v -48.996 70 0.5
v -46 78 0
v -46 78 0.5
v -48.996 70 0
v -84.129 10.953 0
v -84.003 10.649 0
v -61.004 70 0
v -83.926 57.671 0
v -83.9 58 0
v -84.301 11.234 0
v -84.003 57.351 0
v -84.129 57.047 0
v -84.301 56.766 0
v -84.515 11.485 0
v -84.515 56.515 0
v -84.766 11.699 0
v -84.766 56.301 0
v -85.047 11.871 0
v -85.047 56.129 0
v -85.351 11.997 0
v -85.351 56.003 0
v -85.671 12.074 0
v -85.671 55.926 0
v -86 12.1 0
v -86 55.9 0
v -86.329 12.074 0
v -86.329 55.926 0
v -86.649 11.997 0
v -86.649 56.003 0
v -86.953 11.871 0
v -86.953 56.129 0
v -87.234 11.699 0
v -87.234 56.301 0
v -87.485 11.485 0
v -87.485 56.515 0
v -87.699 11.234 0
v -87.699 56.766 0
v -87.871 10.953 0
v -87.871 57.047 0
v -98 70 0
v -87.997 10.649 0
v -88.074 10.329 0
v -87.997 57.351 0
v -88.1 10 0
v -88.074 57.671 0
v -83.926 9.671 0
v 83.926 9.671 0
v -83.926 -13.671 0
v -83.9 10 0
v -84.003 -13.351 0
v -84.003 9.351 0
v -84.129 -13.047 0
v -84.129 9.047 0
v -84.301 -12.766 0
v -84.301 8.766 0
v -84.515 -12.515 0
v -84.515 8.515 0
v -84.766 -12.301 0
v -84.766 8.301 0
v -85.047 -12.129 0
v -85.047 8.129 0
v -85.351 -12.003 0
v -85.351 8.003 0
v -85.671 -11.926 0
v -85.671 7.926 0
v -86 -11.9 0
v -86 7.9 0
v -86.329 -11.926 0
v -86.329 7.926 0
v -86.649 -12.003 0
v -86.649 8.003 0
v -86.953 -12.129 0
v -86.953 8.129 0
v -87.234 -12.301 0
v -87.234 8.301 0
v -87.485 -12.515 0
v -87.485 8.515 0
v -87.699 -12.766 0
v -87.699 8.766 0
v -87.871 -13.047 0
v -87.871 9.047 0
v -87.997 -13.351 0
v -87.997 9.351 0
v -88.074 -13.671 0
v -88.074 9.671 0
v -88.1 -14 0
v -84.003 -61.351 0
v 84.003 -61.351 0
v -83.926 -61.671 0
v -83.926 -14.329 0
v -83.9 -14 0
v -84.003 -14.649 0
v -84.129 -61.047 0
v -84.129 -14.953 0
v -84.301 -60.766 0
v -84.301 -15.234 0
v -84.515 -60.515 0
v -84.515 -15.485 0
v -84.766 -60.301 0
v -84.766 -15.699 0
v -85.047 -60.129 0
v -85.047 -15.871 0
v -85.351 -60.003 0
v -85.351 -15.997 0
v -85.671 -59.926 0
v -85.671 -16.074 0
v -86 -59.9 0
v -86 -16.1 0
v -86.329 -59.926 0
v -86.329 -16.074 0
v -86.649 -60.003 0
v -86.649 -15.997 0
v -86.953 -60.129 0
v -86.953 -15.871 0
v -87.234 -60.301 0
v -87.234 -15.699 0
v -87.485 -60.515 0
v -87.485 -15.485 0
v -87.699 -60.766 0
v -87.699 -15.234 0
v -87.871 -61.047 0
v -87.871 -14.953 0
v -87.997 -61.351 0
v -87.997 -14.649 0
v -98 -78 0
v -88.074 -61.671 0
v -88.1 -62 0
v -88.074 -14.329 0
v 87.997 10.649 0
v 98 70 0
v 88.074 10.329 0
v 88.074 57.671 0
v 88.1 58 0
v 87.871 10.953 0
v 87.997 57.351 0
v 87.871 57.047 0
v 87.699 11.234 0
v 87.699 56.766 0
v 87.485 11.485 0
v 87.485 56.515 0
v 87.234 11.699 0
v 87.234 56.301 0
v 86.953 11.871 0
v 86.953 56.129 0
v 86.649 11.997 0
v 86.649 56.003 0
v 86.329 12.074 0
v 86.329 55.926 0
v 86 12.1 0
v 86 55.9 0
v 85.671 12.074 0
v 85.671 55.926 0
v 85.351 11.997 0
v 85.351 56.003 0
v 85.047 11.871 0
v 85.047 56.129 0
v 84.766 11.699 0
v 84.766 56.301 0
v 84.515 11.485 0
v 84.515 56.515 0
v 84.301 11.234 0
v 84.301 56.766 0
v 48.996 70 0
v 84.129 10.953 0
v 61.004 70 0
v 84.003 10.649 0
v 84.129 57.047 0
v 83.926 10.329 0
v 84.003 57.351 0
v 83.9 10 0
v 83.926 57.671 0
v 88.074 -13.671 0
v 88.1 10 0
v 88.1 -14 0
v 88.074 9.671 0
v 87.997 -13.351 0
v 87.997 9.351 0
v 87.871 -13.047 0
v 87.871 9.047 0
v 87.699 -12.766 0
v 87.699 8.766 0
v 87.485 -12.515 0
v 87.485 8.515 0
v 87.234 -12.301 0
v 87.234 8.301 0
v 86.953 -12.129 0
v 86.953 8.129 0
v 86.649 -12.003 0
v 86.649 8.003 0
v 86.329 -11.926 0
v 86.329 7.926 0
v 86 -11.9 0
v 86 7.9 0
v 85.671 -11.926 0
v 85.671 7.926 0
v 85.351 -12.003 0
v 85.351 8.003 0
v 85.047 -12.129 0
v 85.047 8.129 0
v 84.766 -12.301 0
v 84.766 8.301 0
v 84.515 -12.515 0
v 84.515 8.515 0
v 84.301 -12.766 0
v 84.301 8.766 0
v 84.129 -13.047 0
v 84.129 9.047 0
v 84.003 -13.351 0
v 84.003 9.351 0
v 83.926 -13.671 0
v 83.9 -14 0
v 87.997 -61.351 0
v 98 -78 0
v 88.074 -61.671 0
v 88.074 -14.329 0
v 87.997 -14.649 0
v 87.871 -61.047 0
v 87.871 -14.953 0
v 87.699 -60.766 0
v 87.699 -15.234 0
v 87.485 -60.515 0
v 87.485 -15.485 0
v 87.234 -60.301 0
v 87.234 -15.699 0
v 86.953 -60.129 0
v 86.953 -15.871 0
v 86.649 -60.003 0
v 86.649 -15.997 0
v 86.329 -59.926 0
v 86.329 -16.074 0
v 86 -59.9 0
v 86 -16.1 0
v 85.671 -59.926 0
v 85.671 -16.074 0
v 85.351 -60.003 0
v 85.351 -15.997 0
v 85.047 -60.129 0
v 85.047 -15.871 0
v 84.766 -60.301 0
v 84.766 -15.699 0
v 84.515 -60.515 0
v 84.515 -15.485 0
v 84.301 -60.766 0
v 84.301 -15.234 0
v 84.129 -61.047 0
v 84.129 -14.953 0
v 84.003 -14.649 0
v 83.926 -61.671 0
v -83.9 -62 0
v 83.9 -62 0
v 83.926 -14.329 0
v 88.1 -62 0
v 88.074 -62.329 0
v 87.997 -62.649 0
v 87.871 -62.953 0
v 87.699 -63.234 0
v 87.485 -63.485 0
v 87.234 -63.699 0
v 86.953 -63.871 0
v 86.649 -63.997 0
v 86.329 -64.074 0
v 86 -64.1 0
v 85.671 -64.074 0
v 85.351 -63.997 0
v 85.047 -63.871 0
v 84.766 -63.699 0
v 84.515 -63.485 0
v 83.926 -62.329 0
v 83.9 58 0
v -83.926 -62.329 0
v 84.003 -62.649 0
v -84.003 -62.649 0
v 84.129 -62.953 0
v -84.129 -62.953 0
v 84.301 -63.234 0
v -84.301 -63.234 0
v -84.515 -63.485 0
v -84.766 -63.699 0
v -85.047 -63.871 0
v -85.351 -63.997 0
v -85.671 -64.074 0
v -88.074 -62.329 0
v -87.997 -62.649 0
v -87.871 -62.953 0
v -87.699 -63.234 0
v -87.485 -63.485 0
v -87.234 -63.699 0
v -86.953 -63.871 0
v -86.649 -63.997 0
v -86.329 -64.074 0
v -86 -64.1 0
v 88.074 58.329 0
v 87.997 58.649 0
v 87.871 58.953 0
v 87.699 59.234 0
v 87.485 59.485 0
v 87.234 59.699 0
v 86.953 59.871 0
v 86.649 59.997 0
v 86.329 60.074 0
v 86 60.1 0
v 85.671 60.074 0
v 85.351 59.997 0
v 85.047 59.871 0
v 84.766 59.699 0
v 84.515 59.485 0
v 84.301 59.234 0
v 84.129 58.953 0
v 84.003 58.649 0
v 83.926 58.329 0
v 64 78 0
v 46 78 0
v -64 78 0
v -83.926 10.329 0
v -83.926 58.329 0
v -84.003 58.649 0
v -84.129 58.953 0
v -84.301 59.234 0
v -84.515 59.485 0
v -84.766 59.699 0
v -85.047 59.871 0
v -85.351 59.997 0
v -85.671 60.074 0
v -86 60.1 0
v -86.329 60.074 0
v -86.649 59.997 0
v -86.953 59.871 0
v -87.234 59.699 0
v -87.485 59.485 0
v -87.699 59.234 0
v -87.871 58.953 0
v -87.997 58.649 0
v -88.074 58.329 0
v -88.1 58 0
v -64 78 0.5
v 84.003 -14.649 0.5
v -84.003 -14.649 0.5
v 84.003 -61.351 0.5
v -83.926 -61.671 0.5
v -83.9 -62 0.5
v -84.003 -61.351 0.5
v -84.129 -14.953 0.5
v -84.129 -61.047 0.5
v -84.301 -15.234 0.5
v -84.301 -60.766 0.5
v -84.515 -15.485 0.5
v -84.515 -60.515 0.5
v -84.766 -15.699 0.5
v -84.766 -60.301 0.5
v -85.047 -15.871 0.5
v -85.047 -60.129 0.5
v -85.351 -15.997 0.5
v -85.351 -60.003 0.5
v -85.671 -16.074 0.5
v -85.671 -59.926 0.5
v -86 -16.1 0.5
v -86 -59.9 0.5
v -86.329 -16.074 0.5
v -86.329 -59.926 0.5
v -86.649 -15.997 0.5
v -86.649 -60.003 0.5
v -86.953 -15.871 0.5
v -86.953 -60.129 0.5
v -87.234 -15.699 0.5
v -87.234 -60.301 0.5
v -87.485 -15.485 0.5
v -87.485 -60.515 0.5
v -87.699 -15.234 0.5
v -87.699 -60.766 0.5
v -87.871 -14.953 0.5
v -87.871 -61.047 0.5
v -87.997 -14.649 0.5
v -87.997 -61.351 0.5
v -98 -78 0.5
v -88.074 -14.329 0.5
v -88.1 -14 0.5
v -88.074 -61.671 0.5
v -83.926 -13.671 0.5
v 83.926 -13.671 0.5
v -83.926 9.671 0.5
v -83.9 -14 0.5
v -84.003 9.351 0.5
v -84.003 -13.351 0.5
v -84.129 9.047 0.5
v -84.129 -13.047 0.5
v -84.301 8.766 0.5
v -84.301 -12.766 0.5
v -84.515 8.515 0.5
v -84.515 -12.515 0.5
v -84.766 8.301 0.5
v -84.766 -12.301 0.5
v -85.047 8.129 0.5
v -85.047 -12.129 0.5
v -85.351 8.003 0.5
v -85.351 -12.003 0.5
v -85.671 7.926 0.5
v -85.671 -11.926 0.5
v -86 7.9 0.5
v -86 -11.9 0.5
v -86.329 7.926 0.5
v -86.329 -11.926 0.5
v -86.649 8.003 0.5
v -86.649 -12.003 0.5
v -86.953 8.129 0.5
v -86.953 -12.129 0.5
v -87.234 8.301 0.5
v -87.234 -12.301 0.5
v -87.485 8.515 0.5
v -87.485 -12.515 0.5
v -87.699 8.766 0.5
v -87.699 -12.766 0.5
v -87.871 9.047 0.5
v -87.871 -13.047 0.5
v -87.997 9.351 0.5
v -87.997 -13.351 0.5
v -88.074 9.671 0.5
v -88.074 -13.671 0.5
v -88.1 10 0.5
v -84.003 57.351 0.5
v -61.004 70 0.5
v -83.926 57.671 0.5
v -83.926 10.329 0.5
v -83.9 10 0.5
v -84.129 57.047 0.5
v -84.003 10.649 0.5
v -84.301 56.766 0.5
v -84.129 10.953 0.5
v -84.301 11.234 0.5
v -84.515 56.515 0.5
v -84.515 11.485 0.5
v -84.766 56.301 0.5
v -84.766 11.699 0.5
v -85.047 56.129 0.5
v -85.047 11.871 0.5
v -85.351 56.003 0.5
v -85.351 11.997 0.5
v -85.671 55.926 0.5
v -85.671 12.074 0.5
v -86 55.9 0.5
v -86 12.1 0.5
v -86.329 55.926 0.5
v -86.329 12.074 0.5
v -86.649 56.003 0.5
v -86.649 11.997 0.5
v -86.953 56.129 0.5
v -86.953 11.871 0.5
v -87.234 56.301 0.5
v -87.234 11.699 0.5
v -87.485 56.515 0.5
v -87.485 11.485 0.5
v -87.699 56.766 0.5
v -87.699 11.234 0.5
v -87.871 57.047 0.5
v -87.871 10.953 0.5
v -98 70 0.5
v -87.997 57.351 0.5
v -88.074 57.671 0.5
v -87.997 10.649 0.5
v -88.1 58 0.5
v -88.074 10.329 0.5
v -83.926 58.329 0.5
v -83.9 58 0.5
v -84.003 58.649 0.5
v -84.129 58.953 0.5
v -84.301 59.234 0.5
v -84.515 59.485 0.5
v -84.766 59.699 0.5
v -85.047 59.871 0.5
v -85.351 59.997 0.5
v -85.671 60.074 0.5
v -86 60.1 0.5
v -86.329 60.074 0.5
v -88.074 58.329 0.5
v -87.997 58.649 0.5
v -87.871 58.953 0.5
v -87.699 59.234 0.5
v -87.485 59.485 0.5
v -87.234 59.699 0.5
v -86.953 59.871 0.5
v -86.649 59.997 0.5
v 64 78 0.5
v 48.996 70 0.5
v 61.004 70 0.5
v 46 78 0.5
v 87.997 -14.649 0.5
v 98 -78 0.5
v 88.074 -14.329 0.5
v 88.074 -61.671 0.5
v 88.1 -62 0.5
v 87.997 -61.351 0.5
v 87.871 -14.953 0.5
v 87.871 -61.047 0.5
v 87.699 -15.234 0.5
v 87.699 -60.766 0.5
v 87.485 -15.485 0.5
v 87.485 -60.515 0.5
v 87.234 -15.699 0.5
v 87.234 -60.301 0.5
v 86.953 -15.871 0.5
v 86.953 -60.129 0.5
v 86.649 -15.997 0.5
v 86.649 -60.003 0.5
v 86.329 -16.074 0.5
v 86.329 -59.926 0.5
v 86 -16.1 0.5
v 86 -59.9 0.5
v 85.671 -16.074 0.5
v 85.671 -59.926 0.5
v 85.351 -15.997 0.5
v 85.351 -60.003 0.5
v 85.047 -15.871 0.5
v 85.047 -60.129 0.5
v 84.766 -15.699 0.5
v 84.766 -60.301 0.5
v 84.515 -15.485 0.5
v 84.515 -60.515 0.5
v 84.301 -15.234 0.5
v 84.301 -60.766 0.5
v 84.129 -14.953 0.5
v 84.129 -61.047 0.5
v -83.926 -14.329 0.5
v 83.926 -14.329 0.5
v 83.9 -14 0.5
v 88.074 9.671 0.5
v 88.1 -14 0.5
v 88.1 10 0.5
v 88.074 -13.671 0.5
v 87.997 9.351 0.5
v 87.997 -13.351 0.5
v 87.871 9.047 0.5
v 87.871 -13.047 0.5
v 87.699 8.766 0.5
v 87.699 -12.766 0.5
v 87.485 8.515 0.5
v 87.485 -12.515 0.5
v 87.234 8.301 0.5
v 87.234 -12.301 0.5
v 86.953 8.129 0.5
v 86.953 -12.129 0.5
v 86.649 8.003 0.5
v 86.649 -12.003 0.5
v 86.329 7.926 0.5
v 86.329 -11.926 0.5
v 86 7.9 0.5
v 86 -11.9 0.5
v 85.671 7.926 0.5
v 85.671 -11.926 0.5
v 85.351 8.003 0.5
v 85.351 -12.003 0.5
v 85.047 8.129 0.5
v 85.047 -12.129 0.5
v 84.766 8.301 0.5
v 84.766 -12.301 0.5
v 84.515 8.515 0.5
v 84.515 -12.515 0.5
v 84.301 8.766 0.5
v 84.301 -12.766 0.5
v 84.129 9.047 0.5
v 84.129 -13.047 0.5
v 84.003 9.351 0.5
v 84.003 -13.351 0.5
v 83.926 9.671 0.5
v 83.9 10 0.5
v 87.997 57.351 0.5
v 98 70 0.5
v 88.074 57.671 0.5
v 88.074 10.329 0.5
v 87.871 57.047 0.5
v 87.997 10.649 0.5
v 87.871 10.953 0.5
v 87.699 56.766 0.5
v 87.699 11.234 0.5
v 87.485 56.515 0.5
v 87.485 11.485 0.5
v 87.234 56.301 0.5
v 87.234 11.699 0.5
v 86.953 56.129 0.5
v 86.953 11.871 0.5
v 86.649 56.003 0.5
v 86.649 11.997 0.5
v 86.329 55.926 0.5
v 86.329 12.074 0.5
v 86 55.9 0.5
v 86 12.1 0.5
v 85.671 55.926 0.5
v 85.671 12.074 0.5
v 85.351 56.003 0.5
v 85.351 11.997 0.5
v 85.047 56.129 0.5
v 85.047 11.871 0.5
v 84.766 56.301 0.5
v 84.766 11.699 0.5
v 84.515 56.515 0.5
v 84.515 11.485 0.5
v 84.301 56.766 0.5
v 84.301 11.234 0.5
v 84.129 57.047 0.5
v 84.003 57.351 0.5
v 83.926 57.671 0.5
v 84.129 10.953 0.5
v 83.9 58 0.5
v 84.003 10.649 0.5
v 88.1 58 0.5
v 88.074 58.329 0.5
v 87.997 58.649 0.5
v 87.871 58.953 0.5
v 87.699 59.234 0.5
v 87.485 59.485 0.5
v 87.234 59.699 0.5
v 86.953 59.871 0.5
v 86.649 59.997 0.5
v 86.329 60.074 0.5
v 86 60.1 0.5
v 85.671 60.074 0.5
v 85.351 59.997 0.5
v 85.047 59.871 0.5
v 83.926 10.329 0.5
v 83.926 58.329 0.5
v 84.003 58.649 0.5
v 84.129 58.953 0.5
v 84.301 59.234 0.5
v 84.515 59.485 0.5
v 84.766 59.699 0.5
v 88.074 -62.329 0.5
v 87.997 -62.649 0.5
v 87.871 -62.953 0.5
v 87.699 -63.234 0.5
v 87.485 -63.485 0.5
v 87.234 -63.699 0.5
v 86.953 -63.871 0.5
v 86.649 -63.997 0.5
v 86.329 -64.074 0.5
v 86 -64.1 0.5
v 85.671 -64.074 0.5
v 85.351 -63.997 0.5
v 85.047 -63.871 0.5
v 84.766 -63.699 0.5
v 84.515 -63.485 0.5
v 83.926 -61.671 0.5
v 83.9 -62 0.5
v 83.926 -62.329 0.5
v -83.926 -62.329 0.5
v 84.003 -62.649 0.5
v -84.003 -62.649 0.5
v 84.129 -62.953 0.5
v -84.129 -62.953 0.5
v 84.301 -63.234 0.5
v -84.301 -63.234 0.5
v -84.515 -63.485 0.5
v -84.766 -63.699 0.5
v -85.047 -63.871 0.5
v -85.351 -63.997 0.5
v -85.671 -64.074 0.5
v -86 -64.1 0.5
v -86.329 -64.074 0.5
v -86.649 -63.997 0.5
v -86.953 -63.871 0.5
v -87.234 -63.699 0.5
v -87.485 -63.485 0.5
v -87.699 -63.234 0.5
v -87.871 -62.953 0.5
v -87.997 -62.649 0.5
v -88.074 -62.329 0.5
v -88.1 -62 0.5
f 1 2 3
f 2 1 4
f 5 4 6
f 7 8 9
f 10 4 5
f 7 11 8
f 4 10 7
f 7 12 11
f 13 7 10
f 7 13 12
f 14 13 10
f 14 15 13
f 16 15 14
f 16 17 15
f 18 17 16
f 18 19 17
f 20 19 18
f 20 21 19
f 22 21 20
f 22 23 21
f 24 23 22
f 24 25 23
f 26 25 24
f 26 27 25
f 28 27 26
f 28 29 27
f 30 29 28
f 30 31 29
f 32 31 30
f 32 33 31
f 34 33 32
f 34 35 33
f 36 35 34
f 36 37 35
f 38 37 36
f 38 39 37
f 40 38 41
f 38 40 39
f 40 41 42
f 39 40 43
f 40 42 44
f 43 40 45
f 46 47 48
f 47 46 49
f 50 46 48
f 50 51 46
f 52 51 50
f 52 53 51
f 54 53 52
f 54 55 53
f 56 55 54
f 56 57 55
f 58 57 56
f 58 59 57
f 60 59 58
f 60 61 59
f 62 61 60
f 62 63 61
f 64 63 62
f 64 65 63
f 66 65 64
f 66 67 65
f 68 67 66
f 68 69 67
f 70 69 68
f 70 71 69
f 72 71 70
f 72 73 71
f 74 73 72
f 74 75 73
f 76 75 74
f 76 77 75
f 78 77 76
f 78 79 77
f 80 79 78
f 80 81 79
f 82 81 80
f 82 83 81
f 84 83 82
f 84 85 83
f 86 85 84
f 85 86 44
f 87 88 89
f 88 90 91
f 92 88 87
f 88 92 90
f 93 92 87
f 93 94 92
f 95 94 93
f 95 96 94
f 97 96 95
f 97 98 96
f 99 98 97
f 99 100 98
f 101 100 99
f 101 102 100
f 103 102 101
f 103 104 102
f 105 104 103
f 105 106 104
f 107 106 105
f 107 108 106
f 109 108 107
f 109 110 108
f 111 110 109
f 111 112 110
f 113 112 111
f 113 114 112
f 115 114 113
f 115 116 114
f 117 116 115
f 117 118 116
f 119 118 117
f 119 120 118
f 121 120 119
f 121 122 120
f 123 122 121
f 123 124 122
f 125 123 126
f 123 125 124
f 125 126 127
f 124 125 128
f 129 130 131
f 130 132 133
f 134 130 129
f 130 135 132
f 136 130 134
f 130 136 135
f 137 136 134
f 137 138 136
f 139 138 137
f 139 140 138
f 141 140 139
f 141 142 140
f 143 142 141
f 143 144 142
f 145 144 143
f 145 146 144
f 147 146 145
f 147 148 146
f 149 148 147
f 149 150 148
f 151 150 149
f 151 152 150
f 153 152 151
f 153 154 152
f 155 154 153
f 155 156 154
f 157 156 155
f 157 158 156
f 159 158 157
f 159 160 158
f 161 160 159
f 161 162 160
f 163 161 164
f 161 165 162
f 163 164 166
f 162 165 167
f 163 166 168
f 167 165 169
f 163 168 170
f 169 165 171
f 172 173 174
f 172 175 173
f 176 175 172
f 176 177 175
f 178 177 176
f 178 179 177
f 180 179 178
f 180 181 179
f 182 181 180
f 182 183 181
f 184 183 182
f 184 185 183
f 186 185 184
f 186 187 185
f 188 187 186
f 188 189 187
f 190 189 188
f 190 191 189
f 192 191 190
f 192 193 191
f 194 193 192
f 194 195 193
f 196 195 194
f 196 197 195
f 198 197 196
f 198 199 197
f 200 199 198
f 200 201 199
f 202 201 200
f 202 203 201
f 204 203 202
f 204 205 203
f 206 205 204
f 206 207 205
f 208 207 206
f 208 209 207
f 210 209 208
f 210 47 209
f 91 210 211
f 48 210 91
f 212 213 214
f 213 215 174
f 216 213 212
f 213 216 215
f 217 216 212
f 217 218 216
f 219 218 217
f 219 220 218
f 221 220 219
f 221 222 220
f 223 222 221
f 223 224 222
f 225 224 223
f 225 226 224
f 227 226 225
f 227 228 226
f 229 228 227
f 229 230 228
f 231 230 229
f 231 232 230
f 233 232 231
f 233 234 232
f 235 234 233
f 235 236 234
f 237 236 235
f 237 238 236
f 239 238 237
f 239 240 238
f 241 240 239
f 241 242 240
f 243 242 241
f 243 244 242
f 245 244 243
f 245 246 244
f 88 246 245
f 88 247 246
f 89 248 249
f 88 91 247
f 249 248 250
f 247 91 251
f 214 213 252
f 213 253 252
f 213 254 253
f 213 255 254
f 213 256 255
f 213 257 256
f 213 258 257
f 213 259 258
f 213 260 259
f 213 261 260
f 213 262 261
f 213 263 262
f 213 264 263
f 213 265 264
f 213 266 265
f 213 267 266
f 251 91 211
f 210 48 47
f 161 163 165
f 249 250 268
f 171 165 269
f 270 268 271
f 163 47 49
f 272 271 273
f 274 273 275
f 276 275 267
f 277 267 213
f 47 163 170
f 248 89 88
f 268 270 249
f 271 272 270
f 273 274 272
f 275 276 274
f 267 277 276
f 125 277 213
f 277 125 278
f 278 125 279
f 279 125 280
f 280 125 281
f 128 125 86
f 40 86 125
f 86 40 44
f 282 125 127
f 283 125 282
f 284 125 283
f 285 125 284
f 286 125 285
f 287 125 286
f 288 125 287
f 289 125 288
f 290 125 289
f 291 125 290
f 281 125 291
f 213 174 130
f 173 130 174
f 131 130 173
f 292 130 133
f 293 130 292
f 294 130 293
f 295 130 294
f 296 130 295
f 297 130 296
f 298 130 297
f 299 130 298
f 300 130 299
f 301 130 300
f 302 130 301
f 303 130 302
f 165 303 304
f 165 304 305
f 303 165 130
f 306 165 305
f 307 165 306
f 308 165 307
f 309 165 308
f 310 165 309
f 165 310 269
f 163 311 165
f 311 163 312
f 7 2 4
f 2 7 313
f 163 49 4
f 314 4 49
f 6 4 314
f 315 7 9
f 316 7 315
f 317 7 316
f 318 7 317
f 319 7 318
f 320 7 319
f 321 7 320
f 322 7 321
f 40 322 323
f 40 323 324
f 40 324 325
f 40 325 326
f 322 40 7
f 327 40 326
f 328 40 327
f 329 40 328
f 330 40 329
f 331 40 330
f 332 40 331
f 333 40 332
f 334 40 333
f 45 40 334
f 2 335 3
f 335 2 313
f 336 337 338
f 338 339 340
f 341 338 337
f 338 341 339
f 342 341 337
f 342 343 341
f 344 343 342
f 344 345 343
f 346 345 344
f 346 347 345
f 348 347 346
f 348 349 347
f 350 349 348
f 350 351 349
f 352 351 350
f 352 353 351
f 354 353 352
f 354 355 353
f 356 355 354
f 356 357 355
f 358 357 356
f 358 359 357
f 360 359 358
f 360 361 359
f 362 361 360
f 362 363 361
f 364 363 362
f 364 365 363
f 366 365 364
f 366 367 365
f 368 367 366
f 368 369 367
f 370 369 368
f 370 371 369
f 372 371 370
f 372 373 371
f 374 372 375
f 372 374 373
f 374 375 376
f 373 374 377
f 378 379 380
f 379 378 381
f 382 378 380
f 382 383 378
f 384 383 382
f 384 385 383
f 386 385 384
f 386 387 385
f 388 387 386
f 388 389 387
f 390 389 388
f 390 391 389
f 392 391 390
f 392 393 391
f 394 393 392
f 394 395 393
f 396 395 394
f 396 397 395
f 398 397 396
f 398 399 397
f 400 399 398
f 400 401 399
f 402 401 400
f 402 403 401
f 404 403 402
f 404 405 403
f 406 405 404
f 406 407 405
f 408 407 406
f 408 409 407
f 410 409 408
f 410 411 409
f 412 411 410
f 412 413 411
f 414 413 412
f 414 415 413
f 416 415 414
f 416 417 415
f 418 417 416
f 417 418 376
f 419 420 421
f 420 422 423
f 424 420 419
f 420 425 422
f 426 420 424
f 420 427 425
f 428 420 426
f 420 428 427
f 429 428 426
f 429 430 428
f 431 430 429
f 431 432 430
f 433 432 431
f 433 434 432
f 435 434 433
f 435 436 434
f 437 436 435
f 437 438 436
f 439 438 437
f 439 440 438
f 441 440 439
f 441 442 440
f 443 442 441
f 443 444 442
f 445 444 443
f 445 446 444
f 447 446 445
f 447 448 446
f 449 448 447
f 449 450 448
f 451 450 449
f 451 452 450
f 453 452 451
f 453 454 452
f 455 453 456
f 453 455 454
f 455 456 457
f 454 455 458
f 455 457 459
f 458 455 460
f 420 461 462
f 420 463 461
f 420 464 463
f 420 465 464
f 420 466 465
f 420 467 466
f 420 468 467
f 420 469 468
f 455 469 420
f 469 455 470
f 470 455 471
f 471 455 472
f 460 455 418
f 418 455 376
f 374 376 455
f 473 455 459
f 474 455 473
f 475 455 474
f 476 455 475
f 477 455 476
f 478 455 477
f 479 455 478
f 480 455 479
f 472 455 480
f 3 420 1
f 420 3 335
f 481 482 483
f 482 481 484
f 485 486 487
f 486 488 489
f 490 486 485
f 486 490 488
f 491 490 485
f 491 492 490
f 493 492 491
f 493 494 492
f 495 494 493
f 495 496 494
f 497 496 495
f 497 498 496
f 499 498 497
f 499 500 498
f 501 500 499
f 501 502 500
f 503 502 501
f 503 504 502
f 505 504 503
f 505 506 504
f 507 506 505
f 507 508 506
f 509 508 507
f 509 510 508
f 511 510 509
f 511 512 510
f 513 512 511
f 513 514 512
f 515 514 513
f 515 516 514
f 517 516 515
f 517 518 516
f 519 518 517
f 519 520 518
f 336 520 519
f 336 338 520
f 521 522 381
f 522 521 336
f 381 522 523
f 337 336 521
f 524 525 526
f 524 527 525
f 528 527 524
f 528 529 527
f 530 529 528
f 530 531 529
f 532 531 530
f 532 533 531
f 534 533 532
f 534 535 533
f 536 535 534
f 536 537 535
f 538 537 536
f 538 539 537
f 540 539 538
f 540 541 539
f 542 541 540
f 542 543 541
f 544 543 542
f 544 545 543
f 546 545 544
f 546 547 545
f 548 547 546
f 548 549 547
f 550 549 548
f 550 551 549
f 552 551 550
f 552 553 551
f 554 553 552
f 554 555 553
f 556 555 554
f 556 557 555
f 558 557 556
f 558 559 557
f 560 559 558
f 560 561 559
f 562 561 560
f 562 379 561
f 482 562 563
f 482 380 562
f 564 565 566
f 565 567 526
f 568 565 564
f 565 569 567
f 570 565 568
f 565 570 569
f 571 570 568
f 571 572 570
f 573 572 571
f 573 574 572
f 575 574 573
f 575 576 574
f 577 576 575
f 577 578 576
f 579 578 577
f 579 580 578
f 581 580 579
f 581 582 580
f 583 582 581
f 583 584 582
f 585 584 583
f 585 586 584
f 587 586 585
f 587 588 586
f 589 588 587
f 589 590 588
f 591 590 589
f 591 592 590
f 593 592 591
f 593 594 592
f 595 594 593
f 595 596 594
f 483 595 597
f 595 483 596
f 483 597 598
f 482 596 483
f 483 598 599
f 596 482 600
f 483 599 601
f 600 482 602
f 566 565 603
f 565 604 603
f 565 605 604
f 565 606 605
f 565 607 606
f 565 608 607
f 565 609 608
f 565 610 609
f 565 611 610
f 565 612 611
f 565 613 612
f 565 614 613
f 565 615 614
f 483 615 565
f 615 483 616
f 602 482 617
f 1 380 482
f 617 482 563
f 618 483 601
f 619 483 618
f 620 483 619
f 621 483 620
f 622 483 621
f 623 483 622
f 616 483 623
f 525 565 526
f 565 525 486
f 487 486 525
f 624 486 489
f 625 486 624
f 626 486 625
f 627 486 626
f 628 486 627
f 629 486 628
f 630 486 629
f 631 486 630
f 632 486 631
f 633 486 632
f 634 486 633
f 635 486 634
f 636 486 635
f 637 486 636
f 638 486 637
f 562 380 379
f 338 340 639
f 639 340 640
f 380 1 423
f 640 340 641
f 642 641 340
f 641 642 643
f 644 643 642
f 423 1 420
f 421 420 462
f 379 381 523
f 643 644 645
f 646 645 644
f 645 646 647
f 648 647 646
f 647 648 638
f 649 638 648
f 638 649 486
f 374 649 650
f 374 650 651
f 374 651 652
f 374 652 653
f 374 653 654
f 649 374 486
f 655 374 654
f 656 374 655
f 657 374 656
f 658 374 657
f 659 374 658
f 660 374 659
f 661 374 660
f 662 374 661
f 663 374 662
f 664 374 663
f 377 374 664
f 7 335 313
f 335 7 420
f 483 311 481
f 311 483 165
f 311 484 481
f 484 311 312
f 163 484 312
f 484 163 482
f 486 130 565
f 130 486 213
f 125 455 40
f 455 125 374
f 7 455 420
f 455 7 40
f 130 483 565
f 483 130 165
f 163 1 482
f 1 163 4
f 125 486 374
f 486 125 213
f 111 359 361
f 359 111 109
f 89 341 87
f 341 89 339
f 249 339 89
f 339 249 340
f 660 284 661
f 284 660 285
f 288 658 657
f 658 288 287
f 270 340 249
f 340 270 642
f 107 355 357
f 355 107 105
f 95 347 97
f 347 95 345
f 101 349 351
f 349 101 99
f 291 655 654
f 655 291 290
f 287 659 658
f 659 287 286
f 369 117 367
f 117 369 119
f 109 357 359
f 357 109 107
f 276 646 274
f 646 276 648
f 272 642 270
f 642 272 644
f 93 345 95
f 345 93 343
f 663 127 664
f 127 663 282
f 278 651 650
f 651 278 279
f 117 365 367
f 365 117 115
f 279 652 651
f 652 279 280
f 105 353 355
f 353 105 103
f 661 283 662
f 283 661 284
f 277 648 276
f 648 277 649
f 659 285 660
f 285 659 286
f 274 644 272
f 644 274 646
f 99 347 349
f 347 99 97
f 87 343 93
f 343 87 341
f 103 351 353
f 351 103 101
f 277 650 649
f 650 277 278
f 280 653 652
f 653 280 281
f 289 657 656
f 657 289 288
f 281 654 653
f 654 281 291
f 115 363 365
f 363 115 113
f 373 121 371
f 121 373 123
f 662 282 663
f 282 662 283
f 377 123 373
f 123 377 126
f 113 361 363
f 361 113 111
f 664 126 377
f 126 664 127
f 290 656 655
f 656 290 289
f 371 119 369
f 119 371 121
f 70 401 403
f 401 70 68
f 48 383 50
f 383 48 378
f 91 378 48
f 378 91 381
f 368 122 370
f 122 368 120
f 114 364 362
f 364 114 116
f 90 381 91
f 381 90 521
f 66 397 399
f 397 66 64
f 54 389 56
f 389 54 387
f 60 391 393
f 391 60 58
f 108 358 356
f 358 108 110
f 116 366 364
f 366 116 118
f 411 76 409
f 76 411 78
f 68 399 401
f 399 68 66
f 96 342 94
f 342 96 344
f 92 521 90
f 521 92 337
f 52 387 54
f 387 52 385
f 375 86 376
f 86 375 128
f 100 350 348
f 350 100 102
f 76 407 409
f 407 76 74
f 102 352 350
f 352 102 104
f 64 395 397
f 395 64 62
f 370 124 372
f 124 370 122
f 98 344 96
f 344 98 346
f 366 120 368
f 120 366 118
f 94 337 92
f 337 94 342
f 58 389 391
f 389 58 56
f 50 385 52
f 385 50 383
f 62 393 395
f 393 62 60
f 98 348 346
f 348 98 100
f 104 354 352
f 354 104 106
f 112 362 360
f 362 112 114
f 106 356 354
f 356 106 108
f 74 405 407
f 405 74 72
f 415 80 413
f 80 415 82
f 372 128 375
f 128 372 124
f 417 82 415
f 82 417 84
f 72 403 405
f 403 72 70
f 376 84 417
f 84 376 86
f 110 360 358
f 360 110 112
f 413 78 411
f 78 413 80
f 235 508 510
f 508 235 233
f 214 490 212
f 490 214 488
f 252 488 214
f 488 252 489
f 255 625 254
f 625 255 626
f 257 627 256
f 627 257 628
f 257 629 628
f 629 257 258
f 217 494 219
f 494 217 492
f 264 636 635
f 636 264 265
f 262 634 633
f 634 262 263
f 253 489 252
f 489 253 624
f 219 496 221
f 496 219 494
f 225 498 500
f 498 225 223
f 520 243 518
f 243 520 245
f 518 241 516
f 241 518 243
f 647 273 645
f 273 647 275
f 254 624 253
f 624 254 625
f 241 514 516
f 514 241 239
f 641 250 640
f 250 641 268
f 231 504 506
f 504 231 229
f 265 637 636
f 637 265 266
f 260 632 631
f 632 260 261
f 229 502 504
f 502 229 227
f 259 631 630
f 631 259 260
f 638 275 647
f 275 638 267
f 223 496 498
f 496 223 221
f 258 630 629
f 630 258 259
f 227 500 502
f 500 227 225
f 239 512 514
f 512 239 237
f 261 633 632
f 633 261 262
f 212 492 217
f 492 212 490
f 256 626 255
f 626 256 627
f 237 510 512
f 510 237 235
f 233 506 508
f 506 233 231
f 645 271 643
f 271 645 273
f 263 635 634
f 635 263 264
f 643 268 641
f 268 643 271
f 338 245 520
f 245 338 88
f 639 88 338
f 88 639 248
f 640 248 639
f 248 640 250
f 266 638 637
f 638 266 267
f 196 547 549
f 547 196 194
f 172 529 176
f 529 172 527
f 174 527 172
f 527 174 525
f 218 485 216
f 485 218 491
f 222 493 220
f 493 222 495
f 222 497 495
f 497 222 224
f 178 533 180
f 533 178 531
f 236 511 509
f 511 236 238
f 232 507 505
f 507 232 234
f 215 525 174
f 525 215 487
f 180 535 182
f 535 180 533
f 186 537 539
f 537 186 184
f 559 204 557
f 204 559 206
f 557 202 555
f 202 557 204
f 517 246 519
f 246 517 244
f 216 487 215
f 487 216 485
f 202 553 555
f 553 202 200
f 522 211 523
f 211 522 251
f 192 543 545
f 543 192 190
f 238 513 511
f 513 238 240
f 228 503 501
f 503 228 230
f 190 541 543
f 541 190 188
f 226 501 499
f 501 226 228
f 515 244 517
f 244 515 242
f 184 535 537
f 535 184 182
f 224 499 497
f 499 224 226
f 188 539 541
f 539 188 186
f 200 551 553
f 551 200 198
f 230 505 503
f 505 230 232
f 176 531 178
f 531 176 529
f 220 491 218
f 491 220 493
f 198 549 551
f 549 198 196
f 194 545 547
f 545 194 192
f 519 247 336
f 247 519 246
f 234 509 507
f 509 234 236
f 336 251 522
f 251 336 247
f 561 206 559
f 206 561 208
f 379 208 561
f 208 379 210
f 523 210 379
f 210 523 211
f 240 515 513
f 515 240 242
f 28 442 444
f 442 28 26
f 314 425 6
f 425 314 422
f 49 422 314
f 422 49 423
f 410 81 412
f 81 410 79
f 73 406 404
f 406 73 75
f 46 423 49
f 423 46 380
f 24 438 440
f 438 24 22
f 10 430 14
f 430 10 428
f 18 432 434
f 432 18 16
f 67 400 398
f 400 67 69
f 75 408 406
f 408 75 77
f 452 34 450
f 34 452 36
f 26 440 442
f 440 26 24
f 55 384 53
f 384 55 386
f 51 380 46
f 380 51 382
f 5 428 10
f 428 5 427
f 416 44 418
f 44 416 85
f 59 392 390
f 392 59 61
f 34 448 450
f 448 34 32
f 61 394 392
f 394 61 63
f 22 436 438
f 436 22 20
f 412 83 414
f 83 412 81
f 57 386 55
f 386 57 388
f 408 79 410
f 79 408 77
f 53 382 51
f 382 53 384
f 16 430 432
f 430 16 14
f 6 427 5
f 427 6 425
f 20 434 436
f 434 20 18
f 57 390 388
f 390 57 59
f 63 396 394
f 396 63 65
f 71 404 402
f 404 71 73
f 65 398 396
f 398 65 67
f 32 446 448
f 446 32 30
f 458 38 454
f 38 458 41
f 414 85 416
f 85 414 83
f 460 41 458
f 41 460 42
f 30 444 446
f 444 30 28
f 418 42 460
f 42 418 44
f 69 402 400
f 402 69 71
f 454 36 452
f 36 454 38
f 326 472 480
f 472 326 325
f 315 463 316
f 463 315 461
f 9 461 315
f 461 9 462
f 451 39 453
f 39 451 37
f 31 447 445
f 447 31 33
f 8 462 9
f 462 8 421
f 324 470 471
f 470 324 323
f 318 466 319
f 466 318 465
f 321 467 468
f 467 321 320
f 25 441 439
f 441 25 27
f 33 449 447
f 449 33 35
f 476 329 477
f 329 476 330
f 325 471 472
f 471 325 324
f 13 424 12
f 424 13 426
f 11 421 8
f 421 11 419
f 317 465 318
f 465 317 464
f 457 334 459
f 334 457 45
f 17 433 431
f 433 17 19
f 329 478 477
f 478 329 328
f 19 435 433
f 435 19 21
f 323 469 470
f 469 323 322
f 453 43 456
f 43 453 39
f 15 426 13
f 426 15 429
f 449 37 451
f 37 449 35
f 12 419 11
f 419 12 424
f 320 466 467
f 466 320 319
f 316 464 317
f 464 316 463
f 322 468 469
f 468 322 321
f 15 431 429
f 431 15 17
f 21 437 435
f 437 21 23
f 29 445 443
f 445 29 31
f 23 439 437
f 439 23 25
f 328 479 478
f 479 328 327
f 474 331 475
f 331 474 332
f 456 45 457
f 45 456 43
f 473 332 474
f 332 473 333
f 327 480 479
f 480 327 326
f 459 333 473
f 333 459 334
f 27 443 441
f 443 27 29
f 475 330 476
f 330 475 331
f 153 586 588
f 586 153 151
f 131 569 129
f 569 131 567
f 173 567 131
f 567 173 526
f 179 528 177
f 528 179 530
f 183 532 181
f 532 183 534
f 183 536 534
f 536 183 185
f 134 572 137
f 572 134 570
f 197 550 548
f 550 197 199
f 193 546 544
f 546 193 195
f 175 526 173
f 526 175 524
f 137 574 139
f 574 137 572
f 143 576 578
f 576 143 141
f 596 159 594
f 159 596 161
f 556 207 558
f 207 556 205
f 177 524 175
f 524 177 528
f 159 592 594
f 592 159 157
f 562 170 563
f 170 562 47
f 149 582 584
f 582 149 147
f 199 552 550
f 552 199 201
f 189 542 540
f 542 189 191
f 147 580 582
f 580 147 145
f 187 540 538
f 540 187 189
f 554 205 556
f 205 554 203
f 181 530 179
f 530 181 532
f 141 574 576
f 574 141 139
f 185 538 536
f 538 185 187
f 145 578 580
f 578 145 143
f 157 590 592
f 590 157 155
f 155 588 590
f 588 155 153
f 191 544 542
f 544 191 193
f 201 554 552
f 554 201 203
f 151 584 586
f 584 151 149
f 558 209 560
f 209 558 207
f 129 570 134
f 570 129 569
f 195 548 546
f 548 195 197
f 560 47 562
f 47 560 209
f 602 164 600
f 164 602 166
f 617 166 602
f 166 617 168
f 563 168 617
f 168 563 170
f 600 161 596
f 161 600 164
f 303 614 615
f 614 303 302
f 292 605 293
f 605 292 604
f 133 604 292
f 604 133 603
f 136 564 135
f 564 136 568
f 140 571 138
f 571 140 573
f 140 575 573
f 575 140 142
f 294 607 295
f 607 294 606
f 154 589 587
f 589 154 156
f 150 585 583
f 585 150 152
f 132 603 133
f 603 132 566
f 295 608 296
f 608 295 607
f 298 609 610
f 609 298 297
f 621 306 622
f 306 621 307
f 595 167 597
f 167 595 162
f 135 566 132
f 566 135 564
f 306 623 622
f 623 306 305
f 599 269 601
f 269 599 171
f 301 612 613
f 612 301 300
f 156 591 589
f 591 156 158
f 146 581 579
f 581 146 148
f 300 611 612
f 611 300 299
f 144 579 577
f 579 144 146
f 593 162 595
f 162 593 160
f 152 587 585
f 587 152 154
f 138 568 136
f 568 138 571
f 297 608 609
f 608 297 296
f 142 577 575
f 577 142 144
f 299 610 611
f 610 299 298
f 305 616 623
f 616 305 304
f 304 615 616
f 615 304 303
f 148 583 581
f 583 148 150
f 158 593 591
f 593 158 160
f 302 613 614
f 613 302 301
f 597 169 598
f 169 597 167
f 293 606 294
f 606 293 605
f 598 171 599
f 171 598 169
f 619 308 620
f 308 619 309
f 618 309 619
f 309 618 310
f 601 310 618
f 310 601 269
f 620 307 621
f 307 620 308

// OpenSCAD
include <../lib/filament-spool-roller-lib.scad>;
$fn = 40;

// Print plate 11: the floor drilling template, left half.
color("#00eaff") plate_floor_template(-1);
